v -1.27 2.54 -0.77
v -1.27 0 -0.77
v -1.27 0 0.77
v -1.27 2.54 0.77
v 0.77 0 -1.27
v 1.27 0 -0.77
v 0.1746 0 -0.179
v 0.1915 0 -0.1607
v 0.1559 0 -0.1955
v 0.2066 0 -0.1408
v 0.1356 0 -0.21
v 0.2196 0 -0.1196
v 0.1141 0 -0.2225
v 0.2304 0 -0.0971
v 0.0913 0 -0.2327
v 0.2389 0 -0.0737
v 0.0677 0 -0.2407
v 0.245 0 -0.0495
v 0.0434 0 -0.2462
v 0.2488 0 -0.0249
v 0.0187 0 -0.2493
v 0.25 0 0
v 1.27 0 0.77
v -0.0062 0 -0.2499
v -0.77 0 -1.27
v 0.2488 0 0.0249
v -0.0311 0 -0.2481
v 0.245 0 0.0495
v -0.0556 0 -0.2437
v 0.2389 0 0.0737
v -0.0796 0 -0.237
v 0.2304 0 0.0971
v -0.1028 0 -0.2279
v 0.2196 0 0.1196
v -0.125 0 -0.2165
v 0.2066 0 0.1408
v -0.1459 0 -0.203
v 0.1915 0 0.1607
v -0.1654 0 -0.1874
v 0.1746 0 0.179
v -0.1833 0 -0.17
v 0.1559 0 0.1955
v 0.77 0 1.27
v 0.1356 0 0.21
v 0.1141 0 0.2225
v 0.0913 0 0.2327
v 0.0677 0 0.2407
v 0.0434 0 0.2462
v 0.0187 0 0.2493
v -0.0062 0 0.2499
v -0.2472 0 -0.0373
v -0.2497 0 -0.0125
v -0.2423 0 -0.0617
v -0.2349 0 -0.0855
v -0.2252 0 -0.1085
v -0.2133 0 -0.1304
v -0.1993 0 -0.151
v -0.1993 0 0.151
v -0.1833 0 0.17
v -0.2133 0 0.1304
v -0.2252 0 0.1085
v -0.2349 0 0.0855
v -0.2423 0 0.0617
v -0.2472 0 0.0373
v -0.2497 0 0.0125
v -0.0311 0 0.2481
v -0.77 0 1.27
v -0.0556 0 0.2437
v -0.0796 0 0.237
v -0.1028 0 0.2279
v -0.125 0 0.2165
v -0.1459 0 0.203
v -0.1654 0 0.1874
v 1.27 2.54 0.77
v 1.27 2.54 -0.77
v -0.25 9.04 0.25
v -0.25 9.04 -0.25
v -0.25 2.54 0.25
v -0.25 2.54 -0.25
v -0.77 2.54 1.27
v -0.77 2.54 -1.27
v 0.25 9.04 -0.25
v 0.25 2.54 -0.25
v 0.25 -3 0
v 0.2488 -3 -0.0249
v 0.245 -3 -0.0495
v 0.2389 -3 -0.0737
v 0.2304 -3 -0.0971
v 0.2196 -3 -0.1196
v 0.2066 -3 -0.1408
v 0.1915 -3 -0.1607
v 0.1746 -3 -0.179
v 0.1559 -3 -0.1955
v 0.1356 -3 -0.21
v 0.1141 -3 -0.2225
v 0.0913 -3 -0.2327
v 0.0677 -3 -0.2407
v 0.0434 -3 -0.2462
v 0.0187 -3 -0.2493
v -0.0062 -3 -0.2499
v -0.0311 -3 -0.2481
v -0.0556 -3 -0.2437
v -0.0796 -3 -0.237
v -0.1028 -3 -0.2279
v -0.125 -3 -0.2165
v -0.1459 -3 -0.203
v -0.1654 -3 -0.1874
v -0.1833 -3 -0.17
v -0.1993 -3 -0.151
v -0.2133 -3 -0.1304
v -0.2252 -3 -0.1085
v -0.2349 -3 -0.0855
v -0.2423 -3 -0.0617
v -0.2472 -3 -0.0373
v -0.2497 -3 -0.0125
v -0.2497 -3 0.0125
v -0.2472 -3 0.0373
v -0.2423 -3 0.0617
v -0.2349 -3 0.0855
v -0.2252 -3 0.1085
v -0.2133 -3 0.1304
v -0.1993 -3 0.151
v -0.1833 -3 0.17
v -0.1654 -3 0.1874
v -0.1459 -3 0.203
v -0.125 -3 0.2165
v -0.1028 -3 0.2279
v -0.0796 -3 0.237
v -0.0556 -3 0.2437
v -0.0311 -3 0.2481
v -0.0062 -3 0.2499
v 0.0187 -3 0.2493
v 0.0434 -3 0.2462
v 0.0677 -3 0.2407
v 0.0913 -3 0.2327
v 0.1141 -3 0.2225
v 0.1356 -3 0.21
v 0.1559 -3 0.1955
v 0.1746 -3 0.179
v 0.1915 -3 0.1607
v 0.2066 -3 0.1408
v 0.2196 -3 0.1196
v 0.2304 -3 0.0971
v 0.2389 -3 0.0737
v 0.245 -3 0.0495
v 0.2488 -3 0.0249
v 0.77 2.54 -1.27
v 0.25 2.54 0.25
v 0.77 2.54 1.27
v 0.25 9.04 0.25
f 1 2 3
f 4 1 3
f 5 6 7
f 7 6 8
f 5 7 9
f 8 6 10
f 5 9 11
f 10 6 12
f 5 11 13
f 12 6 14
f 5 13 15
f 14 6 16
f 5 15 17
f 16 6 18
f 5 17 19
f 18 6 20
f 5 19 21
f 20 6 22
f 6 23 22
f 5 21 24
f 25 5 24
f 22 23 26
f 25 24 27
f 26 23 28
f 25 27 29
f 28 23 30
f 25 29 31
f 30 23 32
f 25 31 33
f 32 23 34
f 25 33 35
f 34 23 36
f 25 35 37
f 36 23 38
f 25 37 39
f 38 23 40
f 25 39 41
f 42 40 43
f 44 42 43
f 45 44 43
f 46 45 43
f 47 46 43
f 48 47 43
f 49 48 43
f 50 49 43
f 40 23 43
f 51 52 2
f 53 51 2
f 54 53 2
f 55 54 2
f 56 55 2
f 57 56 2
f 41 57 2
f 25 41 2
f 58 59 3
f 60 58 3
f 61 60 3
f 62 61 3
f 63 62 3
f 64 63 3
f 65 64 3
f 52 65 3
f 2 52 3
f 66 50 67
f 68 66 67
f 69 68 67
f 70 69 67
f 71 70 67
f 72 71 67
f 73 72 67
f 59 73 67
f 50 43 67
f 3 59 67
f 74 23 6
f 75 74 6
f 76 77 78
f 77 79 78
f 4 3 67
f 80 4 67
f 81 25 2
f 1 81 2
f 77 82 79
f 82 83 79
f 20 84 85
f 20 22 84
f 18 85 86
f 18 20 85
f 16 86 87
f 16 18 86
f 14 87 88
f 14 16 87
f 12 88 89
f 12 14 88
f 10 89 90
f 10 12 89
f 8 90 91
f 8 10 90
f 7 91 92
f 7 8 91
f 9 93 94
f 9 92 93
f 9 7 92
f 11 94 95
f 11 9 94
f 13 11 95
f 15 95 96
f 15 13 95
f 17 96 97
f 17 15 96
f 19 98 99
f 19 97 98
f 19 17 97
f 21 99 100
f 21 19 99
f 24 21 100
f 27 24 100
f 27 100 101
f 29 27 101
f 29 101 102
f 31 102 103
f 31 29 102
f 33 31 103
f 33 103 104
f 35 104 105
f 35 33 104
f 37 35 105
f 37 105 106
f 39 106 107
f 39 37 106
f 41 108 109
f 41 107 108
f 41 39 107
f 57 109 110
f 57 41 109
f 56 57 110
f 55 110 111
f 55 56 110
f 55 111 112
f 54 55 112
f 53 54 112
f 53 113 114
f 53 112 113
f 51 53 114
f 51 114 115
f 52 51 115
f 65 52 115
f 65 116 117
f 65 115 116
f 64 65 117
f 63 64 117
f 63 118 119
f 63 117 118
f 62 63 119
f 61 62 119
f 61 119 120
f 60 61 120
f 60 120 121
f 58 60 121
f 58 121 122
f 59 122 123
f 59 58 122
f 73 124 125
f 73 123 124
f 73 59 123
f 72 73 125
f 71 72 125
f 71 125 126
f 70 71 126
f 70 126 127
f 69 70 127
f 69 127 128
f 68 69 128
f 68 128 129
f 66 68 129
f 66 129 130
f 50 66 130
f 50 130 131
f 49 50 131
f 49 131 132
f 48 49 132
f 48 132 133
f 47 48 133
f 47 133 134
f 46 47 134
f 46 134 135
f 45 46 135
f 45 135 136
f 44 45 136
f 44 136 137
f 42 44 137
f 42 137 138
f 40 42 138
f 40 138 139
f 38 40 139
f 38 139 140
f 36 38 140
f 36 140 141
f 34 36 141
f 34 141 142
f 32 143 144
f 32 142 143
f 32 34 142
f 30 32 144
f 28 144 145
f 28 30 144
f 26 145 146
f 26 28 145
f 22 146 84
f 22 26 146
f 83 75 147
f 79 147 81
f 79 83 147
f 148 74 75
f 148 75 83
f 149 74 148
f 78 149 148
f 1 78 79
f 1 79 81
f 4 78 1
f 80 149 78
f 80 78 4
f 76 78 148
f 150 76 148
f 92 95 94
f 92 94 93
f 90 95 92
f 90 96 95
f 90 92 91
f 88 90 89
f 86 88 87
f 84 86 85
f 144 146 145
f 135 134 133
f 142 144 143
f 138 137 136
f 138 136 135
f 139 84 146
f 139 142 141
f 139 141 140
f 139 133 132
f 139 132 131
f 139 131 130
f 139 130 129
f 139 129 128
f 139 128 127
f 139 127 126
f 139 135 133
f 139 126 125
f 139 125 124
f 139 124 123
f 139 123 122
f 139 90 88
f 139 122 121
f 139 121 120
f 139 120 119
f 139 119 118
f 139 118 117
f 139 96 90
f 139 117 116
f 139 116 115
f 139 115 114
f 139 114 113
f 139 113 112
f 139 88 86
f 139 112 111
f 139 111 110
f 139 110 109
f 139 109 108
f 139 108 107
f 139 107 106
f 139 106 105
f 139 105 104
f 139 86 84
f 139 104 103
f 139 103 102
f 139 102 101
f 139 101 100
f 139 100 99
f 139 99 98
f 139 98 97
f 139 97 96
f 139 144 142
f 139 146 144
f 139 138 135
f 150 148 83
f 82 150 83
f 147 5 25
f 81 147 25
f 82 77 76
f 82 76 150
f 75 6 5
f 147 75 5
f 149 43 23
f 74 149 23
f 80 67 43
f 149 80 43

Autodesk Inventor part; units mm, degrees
ref_plane "YZ Plane" through (0, 0, 0) normal (1, 0, 0) x (0, 1, 0)
ref_plane "XZ Plane" through (0, 0, 0) normal (0, 1, 0) x (-1, 0, 0)
ref_plane "XY Plane" through (0, 0, 0) normal (0, 0, 1) x (1, 0, 0)
sketch "Sketch3" plane through (0, 0, 0) normal (0, 1, 0) x (-1, 0, 0)
  line L0 (0.77, 1.27) -> (-0.77, 1.27)
  line L1 (-1.27, 0.77) -> (-1.27, -0.77)
  line L2 (-0.77, -1.27) -> (0.77, -1.27)
  line L3 (1.27, -0.77) -> (1.27, 0.77)
  line L4 (1.27, 0.77) -> (0.77, 1.27)
  line L5 (-0.77, 1.27) -> (-1.27, 0.77)
  line L6 (-1.27, -0.77) -> (-0.77, -1.27)
  line L7 (0.77, -1.27) -> (1.27, -0.77)
  point P0 (0, 0)
  point P1 (-1.27, 0)
  point P2 (0, -1.27)
  dimension "d6" = 2.54
  dimension "d7" = 0.5
  dimension "d8" = 45
extrude "Extrusion3" add sketch "Sketch3" along normal blind 2.54
sketch "Sketch4" plane through (0, 2.54, 0) normal (0, 1, 0) x (1, 0, 0)
  line L0 (-0.25, -0.25) -> (0.25, -0.25)
  line L1 (0.25, -0.25) -> (0.25, 0.25)
  line L2 (0.25, 0.25) -> (-0.25, 0.25)
  line L3 (-0.25, 0.25) -> (-0.25, -0.25)
  point P0 (0, 0)
  point P1 (0, 0.25)
  point P2 (-0.25, 0)
  dimension "d11" = 0.5
extrude "Extrusion4" add sketch "Sketch4" along normal blind 6.5
sketch "Sketch5" plane through (0, 0, 0) normal (0, -1, 0) x (1, 0, 0)
  circle A0 centre (0, 0) radius 0.25
  dimension "d14" = 0.5
extrude "Extrusion5" add sketch "Sketch5" along normal blind 3
properties part number "Pin-round-2.54-male"
